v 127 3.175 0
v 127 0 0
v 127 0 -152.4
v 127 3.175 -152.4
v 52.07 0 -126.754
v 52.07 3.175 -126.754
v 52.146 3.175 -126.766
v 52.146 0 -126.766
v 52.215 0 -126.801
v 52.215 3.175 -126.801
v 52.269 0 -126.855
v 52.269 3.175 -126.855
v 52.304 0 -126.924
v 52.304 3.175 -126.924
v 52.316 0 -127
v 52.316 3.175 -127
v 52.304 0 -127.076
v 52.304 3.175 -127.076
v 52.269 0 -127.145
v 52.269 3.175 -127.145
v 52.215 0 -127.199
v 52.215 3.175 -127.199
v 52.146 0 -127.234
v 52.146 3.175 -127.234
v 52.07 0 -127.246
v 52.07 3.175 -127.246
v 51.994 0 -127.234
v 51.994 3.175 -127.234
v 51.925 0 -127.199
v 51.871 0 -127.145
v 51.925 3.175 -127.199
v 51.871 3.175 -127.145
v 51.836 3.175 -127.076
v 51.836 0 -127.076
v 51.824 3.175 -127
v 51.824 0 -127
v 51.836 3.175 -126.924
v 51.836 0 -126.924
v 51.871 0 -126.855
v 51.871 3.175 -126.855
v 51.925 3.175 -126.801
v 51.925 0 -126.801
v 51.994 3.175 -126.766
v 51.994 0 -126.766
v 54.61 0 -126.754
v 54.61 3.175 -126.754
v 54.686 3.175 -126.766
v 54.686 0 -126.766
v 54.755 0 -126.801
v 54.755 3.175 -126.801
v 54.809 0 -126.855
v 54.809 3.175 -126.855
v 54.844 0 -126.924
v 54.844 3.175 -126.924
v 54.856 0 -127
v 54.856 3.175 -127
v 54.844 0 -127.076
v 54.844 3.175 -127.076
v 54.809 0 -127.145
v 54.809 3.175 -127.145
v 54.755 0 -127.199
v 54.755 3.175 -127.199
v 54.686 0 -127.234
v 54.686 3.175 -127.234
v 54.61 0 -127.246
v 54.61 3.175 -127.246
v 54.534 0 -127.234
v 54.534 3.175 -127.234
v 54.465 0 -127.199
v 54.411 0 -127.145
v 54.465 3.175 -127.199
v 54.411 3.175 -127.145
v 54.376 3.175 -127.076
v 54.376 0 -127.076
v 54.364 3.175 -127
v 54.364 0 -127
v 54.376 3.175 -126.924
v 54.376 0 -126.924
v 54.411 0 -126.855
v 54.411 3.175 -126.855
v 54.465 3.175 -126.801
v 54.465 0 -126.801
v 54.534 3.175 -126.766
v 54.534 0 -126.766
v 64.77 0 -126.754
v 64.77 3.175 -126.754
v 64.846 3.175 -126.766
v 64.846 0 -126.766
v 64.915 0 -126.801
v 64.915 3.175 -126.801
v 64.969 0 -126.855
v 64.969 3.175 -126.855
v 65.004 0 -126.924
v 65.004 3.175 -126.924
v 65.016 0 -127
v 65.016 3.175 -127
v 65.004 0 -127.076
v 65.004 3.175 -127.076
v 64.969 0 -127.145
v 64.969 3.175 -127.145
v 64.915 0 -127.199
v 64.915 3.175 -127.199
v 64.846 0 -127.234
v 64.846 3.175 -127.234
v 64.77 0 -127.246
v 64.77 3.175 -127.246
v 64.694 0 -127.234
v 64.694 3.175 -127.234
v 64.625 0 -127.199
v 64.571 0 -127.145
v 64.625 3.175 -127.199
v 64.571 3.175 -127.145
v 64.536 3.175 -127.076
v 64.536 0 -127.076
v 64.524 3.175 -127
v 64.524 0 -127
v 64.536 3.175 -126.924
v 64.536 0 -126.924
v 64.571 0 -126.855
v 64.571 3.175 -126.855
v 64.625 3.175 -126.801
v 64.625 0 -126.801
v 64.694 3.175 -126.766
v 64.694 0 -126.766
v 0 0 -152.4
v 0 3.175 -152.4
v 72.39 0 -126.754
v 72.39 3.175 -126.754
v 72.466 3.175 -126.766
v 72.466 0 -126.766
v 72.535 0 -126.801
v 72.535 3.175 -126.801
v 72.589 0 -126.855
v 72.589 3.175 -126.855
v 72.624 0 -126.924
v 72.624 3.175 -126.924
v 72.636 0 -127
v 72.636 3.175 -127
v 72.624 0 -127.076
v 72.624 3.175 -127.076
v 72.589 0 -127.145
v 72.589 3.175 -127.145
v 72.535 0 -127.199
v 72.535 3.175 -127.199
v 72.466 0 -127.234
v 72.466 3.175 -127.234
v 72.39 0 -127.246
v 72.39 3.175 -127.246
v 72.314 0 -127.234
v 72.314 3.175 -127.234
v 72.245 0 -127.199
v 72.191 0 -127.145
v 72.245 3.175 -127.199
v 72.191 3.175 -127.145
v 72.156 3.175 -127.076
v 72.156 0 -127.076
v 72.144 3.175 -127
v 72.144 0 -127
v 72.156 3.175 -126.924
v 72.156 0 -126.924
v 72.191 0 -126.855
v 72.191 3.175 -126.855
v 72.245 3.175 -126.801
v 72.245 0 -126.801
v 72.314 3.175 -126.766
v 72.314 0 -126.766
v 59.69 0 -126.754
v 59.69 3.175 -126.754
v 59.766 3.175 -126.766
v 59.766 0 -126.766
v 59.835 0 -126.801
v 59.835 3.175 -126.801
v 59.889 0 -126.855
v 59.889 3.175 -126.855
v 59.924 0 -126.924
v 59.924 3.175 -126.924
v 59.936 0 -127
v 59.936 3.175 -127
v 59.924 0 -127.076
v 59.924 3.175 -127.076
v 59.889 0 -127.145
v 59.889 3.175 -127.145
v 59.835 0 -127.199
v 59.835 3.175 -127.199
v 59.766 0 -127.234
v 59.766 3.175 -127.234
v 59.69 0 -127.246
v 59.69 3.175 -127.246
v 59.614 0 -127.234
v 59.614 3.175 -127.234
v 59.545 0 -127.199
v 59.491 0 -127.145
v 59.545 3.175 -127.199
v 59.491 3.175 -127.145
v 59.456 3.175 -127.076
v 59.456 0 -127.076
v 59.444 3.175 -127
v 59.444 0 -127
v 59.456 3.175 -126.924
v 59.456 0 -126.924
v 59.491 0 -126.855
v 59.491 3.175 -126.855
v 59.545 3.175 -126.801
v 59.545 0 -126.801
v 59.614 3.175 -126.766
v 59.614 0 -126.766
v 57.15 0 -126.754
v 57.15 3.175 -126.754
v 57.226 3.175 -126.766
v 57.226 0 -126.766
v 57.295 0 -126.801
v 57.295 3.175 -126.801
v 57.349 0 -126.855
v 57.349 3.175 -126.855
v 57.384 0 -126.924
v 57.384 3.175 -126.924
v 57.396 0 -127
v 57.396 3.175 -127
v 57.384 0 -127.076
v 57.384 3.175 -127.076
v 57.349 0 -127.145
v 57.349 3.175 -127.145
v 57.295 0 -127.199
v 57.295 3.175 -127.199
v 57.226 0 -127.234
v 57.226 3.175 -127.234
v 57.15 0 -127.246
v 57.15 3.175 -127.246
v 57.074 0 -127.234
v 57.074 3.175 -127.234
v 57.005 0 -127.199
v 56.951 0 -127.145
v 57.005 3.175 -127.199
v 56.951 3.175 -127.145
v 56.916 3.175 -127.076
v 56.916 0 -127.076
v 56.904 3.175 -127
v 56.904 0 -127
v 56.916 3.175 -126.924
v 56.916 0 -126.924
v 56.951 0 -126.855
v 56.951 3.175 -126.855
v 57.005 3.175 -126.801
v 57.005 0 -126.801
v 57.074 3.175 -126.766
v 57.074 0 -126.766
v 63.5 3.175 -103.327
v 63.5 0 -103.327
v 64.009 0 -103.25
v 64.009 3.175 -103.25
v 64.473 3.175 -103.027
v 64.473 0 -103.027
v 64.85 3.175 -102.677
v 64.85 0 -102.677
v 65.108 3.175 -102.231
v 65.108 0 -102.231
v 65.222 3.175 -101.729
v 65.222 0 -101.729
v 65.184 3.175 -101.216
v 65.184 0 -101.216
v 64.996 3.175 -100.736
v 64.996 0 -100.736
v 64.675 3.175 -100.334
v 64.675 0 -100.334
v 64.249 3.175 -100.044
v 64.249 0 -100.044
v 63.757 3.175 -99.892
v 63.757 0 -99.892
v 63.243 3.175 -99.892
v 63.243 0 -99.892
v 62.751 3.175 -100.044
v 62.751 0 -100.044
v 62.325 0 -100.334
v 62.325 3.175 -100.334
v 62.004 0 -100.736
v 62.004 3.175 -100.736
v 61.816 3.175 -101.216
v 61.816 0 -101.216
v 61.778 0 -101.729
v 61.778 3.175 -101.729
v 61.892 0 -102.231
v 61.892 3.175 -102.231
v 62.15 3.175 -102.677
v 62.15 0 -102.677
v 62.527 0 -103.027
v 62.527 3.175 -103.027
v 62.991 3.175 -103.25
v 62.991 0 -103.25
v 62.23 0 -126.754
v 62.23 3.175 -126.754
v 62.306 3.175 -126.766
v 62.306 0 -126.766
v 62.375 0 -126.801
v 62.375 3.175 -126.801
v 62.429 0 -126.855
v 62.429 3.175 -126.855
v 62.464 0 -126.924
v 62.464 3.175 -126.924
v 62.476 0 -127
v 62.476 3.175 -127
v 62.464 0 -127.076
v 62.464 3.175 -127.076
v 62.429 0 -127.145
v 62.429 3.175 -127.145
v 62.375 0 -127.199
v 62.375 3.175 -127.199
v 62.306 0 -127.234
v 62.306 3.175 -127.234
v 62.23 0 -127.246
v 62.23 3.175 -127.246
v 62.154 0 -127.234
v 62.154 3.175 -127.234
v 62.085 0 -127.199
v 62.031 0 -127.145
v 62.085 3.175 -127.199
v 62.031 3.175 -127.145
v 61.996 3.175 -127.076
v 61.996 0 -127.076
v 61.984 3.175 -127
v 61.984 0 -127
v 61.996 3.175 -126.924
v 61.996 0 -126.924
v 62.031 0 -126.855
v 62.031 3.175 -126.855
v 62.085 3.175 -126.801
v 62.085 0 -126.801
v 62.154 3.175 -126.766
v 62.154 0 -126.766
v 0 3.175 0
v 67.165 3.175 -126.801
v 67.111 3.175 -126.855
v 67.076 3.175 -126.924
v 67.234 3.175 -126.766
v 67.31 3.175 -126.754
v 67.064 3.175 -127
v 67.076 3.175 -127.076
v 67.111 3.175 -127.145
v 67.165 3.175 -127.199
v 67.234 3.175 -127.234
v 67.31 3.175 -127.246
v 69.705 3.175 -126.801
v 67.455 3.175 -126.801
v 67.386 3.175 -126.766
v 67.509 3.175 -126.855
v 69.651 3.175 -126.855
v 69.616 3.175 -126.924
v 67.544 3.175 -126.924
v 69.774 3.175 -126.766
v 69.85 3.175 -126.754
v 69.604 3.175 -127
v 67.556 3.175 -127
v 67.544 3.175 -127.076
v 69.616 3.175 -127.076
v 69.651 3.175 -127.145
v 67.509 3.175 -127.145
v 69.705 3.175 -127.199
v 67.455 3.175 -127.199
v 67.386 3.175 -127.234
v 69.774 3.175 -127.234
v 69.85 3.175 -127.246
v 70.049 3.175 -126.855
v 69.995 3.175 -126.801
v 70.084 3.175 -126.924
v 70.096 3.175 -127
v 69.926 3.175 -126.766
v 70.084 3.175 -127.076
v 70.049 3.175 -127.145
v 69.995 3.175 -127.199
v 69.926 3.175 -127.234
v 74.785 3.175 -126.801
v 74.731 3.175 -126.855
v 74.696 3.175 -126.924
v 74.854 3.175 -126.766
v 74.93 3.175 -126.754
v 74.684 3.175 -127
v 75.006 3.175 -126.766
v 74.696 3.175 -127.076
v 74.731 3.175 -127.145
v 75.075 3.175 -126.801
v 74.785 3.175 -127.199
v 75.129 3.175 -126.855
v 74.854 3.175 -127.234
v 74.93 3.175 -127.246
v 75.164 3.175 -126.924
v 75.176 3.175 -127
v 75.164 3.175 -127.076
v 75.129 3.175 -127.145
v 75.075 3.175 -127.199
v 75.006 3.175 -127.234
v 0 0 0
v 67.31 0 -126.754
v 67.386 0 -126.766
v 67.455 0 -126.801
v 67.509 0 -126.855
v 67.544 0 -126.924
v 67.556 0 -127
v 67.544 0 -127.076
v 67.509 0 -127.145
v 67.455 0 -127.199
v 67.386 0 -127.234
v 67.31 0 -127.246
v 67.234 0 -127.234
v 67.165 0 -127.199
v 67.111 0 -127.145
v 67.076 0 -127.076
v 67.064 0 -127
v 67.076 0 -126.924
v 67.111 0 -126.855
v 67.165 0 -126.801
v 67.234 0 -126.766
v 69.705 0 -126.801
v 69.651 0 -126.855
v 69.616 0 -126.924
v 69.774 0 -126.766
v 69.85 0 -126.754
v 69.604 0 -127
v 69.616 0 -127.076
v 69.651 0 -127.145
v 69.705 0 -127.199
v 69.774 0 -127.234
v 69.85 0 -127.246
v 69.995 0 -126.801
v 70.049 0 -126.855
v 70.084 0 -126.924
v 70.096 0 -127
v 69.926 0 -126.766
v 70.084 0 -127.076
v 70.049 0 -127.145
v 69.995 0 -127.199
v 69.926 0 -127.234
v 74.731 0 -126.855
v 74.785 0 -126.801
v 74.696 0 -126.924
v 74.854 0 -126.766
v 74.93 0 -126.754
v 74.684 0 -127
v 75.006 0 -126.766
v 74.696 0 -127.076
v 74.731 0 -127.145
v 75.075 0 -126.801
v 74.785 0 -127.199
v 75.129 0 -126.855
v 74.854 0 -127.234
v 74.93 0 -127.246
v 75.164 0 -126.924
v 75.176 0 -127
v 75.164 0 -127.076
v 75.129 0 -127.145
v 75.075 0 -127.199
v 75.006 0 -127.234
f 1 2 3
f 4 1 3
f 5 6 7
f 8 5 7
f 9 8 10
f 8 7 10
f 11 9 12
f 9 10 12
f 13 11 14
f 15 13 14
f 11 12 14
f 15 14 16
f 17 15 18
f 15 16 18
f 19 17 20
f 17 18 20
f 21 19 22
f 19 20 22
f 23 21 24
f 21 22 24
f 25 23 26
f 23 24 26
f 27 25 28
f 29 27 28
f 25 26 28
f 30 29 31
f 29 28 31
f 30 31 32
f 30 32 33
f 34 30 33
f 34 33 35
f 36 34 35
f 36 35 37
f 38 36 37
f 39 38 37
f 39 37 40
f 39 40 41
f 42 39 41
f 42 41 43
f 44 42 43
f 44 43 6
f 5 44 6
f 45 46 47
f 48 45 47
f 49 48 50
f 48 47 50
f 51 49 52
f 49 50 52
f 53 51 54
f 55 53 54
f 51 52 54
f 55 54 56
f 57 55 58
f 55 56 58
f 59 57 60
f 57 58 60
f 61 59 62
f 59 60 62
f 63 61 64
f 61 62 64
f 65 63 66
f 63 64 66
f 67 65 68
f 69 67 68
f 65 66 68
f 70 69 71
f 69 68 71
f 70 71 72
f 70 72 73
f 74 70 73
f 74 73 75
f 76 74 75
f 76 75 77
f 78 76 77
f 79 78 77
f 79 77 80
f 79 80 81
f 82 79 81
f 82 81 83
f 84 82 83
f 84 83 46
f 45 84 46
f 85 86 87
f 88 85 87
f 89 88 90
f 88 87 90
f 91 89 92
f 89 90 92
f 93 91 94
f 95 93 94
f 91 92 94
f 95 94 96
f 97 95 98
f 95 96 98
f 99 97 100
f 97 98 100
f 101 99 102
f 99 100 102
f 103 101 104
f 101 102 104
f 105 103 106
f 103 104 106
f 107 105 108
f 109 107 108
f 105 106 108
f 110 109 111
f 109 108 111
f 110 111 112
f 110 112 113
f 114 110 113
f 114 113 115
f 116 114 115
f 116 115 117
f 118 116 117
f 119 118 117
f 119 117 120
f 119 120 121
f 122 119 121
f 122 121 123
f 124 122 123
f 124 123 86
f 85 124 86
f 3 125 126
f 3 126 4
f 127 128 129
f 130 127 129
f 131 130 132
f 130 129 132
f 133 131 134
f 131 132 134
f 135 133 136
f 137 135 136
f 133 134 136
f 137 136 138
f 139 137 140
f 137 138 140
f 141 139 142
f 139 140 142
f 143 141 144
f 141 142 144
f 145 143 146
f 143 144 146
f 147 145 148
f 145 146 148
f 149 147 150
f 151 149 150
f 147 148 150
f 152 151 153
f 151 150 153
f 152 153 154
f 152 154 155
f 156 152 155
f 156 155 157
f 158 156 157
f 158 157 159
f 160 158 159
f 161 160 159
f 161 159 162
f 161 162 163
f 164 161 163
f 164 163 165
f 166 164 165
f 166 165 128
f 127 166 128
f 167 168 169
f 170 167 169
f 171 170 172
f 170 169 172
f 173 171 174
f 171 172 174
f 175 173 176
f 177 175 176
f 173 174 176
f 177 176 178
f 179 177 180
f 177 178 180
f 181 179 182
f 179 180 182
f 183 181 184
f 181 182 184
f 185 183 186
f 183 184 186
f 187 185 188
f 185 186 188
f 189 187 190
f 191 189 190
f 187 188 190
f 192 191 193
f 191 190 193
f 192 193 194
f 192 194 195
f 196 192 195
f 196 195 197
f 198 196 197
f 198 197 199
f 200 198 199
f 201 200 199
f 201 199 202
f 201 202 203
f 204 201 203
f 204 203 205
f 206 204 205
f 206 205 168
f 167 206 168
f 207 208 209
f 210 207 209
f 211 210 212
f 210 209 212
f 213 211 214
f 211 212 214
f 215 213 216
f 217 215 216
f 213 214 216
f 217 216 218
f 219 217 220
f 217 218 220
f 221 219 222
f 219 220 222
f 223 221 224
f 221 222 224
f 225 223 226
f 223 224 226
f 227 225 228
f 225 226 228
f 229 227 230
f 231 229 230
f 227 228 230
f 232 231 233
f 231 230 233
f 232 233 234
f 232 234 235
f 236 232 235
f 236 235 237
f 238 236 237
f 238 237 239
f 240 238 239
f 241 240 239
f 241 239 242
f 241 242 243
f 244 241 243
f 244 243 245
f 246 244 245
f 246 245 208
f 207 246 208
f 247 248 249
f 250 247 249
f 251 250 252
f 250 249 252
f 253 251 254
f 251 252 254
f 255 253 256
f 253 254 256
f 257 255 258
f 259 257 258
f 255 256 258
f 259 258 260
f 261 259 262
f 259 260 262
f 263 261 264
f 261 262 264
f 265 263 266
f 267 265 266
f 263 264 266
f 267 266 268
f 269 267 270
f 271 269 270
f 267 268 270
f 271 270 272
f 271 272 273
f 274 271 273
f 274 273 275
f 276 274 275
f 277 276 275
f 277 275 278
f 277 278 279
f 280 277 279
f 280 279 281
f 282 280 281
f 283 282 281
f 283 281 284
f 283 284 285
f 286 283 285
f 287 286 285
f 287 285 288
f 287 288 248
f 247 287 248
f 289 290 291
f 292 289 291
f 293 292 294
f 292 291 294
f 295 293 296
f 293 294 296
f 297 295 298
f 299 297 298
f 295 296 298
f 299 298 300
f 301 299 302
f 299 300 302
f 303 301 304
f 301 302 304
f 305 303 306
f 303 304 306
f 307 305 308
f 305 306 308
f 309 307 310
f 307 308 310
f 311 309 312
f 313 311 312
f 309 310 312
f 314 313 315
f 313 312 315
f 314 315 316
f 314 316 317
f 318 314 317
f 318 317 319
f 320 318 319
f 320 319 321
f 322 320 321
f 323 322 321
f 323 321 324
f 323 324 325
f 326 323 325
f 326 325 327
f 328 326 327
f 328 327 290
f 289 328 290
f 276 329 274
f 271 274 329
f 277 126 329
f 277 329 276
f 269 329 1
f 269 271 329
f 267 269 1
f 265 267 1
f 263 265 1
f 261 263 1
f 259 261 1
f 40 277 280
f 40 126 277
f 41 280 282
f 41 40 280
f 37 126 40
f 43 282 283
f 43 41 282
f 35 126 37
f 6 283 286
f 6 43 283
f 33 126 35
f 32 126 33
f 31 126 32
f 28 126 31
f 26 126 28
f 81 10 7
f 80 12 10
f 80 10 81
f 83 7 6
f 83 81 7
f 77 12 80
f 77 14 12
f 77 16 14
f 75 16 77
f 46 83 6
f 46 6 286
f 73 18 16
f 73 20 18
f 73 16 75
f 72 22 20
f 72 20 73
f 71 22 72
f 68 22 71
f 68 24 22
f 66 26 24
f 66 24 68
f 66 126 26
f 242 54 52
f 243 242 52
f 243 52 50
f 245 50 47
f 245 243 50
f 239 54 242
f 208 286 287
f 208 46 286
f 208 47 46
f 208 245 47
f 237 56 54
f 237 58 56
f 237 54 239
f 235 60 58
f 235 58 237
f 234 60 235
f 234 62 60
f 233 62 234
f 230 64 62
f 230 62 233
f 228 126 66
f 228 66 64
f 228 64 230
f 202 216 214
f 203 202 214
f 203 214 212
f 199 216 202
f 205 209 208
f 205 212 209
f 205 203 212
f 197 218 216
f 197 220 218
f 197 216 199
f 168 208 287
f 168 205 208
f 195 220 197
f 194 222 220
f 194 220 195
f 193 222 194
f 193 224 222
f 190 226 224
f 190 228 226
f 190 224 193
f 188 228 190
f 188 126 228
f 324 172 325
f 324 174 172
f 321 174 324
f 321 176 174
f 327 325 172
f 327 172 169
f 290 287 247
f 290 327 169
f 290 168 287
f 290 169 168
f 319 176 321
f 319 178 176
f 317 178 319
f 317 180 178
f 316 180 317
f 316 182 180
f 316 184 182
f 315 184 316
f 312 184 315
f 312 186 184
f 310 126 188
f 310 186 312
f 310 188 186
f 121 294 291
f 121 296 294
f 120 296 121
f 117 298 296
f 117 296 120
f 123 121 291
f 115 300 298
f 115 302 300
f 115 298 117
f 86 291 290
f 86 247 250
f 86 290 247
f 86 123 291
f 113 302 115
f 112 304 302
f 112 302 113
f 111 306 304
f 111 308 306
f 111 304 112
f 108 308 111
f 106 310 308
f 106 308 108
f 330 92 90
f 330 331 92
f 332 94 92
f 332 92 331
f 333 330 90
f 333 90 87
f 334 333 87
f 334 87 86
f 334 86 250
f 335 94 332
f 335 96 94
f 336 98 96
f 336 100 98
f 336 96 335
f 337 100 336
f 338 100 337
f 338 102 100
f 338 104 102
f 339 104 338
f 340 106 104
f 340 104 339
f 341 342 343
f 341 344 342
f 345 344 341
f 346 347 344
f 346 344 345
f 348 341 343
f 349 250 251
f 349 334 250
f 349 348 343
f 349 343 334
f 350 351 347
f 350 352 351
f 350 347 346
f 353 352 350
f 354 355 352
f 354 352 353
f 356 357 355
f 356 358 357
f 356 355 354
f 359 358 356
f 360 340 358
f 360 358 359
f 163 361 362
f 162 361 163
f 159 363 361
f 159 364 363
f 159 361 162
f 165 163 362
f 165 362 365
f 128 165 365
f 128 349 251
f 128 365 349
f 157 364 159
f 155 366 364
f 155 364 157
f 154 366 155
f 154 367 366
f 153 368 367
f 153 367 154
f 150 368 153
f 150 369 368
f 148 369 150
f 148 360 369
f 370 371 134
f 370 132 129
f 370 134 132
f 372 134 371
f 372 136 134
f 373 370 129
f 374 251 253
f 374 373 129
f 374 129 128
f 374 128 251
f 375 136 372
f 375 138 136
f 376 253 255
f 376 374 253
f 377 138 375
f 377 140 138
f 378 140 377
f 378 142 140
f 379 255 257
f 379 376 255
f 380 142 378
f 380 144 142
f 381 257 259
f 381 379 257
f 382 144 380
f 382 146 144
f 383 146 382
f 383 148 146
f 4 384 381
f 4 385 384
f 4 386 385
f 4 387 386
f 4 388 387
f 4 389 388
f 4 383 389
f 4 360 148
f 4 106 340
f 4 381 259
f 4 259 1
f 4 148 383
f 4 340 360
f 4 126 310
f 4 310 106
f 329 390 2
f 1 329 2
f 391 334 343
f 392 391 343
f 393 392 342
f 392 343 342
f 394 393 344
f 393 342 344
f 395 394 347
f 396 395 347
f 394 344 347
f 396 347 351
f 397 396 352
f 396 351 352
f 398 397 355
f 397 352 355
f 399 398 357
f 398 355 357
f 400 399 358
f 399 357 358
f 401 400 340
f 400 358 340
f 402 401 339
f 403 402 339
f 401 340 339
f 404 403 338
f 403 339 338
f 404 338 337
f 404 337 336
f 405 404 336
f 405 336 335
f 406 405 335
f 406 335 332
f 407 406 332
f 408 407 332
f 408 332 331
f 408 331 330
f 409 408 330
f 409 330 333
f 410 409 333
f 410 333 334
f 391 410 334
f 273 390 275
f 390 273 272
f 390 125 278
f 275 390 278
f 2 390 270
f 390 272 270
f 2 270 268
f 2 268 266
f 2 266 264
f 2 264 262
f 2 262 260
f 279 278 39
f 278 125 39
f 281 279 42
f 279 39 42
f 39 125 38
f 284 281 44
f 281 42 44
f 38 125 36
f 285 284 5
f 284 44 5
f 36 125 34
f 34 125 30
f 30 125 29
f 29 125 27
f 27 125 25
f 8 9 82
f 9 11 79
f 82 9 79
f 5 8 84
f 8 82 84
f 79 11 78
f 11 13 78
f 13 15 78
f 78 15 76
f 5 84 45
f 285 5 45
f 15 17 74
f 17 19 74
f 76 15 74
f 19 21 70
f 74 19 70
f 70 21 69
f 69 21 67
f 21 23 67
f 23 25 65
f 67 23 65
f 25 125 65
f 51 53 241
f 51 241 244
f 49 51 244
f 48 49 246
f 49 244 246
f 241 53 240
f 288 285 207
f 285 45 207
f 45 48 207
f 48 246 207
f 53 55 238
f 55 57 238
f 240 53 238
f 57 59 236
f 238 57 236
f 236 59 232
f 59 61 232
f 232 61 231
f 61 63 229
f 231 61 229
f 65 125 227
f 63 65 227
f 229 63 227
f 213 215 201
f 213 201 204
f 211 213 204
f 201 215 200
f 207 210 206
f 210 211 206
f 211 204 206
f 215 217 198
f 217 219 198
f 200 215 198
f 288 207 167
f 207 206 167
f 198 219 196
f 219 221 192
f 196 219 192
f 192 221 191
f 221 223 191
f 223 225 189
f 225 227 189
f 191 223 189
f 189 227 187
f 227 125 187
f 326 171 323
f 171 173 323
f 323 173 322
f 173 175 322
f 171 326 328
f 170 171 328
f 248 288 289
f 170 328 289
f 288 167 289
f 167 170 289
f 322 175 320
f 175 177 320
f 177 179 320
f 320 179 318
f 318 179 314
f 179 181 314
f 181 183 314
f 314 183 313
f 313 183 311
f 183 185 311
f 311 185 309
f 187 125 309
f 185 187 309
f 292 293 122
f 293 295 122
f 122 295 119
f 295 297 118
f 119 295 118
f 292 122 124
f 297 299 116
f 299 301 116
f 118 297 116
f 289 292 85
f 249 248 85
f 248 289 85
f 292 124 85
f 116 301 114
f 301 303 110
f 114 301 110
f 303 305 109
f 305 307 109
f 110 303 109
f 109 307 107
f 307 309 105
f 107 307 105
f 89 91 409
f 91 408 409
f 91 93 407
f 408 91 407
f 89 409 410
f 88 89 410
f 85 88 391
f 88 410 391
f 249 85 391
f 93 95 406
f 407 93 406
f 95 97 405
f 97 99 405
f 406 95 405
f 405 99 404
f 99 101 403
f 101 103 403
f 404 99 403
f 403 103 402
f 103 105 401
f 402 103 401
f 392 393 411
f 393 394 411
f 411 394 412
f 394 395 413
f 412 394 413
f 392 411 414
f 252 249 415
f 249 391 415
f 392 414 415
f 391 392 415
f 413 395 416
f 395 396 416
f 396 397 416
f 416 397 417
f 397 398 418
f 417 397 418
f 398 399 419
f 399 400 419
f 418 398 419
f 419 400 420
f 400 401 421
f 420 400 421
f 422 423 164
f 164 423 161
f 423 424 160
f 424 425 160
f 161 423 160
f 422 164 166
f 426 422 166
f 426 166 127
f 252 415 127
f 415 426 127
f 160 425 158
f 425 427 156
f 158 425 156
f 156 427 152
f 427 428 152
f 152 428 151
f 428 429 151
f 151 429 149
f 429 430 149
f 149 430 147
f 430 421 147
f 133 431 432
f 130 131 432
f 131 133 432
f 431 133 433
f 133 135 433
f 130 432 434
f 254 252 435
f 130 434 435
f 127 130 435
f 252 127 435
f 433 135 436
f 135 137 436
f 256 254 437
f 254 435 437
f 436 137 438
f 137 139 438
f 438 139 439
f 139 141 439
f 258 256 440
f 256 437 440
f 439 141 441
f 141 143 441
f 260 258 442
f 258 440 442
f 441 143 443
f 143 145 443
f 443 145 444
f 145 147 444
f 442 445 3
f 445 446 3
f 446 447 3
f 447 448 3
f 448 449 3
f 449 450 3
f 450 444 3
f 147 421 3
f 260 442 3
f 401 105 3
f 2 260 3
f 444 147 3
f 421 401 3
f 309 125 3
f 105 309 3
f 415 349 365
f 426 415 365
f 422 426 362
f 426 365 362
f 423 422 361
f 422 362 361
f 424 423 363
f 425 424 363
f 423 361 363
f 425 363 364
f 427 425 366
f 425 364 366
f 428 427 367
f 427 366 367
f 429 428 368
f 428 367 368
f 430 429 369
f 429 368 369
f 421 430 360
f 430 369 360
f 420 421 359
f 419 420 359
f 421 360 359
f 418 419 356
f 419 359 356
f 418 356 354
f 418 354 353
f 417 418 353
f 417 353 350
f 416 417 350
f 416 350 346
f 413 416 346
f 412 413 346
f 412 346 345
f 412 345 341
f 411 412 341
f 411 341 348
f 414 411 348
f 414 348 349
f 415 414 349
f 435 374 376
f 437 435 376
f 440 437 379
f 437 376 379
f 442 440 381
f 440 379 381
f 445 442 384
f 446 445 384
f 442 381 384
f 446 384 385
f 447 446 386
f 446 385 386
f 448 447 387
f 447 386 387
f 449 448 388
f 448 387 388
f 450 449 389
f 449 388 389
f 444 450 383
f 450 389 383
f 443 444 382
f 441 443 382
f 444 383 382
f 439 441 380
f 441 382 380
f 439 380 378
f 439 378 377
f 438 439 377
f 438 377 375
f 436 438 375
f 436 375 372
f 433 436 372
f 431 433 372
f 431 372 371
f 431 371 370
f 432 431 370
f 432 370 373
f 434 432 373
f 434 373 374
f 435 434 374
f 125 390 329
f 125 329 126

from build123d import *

# Parameters (mm, degrees)
SKETCH1_W             = 127
SKETCH1_H             = 152.4
BOSS_EXTRUDE1_DEPTH   = 3.175
F_8_32_TAPPED_HOLE2_D = 3.4544
SKETCH8_R             = 0.246300585
CUT_EXTRUDE1_DEPTH    = 199.40574746


with BuildPart() as part:
    # Sketch1 → Boss-Extrude1 (new body)
    with BuildSketch(Plane(origin=(0, 0, 0), x_dir=(1, 0, 0), z_dir=(0, 1, 0))):
        with Locations((63.5, 76.2)):
            Rectangle(SKETCH1_W, SKETCH1_H)
    extrude(amount=BOSS_EXTRUDE1_DEPTH)

    # #8-32 Tapped Hole2 (through all)
    with Locations(Plane(origin=(63.5, 3.175, -101.6), x_dir=(0, 0, 1), z_dir=(0, 1, 0))):
        with Locations((0, 0)):
            Hole(F_8_32_TAPPED_HOLE2_D / 2)

    # Sketch8 → Cut-Extrude1 (cut, through all)
    with BuildSketch(Plane(origin=(0, 3.175, 0), x_dir=(1, 0, 0), z_dir=(0, 1, 0))):
        with Locations(Location((52.07, 127, 0), (0, 0, 270))):
            Circle(SKETCH8_R)
        with Locations(Location((54.61, 127, 0), (0, 0, 270))):
            Circle(SKETCH8_R)
        with Locations(Location((57.15, 127, 0), (0, 0, 270))):
            Circle(SKETCH8_R)
        with Locations(Location((59.69, 127, 0), (0, 0, 270))):
            Circle(SKETCH8_R)
        with Locations(Location((62.23, 127, 0), (0, 0, 270))):
            Circle(SKETCH8_R)
        with Locations(Location((64.77, 127, 0), (0, 0, 270))):
            Circle(SKETCH8_R)
        with Locations(Location((67.31, 127, 0), (0, 0, 270))):
            Circle(SKETCH8_R)
        with Locations(Location((69.85, 127, 0), (0, 0, 270))):
            Circle(SKETCH8_R)
        with Locations(Location((72.39, 127, 0), (0, 0, 270))):
            Circle(SKETCH8_R)
        with Locations(Location((74.93, 127, 0), (0, 0, 270))):
            Circle(SKETCH8_R)
    extrude(amount=-CUT_EXTRUDE1_DEPTH, mode=Mode.SUBTRACT)


solid = part.part
